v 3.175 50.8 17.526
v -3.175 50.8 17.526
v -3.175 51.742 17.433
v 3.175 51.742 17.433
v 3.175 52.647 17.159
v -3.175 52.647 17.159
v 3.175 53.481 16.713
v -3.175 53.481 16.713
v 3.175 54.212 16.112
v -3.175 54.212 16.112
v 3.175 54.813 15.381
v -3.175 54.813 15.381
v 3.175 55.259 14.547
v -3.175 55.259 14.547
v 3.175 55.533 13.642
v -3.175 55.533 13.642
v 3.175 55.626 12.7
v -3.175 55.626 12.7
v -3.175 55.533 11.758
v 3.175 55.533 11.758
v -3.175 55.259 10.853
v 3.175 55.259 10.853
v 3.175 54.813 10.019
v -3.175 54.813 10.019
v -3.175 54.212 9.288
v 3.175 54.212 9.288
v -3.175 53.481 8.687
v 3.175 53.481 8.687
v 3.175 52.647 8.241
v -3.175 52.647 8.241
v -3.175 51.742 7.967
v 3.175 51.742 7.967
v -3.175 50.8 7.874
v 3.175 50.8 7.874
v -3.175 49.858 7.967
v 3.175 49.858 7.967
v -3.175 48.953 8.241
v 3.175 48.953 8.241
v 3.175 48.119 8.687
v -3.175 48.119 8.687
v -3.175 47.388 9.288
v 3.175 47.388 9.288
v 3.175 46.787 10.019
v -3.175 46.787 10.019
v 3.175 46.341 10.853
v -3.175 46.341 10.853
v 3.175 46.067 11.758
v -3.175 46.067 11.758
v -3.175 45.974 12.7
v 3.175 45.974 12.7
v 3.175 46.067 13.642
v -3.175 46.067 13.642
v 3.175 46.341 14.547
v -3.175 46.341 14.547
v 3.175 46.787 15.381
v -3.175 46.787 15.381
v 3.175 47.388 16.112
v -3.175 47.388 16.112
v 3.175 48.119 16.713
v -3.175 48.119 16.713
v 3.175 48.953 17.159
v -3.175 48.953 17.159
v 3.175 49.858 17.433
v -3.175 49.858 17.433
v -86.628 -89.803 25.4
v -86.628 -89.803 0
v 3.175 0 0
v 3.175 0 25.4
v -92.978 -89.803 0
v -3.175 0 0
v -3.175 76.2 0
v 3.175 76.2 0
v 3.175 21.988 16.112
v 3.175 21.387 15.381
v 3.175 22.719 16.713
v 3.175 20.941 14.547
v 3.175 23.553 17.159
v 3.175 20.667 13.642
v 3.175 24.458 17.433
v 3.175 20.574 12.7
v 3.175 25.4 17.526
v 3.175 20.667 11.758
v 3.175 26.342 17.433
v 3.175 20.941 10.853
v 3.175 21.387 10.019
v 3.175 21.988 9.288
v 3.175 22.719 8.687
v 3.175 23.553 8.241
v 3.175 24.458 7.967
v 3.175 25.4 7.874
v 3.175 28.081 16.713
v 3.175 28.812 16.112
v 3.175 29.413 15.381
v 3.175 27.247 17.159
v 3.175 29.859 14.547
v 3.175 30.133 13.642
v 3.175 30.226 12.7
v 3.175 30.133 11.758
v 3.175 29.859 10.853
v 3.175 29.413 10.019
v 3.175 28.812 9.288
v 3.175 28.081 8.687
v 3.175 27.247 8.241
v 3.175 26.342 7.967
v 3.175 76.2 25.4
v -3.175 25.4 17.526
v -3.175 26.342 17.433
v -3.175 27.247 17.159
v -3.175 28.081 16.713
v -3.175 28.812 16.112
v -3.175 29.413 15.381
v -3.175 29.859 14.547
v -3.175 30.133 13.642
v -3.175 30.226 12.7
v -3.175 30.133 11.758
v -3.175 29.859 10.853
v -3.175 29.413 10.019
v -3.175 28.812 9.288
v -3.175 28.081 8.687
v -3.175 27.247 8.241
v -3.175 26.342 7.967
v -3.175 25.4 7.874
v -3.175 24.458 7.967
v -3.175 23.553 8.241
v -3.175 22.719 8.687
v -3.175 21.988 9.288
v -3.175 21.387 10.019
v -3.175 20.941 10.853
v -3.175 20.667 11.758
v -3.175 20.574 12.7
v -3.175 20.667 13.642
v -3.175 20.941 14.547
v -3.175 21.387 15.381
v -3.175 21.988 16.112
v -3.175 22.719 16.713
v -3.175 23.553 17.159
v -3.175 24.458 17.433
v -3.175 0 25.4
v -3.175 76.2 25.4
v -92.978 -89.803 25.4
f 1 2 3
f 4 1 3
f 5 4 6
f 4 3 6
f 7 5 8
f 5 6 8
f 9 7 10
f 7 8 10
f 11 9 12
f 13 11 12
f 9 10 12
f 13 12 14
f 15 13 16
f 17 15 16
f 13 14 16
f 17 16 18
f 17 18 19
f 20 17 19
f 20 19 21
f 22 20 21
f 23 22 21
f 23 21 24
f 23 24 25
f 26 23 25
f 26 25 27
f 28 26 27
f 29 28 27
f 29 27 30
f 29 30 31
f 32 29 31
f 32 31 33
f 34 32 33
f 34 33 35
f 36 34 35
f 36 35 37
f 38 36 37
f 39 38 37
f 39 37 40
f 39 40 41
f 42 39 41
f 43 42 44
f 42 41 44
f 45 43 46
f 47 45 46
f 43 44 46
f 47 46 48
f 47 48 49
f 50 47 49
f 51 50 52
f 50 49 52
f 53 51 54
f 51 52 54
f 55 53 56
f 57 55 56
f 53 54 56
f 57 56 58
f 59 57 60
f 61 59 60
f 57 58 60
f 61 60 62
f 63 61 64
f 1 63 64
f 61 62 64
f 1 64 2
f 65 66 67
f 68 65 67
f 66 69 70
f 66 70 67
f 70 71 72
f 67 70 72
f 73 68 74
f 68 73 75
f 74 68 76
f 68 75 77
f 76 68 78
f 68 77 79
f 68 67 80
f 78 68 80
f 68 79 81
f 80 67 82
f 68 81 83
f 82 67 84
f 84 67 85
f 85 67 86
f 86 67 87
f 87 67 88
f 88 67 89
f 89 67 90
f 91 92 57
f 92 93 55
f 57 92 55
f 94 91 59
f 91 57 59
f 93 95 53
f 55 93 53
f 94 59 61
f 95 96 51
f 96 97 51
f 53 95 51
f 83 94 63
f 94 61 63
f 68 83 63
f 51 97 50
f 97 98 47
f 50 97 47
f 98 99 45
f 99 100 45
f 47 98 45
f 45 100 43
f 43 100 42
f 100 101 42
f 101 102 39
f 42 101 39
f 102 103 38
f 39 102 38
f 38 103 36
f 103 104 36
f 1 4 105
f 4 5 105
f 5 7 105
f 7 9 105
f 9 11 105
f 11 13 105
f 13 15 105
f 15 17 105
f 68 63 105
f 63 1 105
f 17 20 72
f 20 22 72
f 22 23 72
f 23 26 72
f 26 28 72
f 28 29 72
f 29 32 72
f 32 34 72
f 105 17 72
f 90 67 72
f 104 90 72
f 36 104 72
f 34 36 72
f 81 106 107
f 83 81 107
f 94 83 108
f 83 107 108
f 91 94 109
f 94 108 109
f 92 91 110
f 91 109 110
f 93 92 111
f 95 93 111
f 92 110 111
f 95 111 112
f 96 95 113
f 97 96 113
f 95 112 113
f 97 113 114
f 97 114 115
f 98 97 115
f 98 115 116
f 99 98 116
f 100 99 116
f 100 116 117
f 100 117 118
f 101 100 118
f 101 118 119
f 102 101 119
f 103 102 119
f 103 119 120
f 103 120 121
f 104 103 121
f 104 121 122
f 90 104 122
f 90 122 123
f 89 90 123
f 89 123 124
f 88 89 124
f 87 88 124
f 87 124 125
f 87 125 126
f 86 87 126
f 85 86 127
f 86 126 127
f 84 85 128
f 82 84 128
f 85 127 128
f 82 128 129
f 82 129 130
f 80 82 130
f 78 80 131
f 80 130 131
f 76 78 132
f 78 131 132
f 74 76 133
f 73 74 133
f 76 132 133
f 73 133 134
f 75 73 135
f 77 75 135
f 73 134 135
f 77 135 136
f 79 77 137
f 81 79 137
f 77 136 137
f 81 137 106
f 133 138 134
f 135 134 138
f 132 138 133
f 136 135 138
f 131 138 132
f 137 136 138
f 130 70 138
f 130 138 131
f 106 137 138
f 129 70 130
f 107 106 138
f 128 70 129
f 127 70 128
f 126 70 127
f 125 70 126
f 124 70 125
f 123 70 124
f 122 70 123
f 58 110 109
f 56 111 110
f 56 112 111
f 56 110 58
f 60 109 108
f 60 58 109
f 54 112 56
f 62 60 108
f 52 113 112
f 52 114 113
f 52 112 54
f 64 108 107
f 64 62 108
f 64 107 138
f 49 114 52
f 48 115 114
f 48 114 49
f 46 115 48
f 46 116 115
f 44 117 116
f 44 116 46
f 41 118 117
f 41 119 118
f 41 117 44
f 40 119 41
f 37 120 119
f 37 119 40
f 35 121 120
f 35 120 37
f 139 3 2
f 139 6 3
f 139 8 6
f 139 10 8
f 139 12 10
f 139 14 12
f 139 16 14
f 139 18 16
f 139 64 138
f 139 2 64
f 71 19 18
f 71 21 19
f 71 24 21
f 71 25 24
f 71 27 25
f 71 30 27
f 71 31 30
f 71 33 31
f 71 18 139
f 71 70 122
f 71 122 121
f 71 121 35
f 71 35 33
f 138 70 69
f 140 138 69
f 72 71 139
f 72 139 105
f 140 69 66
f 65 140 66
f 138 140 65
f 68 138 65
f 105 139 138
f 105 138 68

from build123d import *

# Parameters (mm, degrees)
SKETCH1_W           = 6.35
SKETCH1_H           = 76.2
BOSS_EXTRUDE1_DEPTH = 25.4
SKETCH2_R           = 4.826
CUT_EXTRUDE1_DEPTH  = 25.4


with BuildPart() as part:
    # Sketch1 → Boss-Extrude1 (new body)
    with BuildSketch(Plane.XY):
        with Locations((0, 38.1)):
            Rectangle(SKETCH1_W, SKETCH1_H)
        Polygon((-92.977561211, -89.802561211), (-86.627561211, -89.802561211), (3.175, 0), (-3.175, 0), align=None)
    extrude(amount=BOSS_EXTRUDE1_DEPTH)

    # Sketch2 → Cut-Extrude1 (cut)
    with BuildSketch(Plane.ZY.offset(3.175)):
        with Locations((12.7, 50.8)):
            Circle(SKETCH2_R)
        with Locations((12.7, 25.4)):
            Circle(SKETCH2_R)
    extrude(amount=-CUT_EXTRUDE1_DEPTH, mode=Mode.SUBTRACT)


solid = part.part
